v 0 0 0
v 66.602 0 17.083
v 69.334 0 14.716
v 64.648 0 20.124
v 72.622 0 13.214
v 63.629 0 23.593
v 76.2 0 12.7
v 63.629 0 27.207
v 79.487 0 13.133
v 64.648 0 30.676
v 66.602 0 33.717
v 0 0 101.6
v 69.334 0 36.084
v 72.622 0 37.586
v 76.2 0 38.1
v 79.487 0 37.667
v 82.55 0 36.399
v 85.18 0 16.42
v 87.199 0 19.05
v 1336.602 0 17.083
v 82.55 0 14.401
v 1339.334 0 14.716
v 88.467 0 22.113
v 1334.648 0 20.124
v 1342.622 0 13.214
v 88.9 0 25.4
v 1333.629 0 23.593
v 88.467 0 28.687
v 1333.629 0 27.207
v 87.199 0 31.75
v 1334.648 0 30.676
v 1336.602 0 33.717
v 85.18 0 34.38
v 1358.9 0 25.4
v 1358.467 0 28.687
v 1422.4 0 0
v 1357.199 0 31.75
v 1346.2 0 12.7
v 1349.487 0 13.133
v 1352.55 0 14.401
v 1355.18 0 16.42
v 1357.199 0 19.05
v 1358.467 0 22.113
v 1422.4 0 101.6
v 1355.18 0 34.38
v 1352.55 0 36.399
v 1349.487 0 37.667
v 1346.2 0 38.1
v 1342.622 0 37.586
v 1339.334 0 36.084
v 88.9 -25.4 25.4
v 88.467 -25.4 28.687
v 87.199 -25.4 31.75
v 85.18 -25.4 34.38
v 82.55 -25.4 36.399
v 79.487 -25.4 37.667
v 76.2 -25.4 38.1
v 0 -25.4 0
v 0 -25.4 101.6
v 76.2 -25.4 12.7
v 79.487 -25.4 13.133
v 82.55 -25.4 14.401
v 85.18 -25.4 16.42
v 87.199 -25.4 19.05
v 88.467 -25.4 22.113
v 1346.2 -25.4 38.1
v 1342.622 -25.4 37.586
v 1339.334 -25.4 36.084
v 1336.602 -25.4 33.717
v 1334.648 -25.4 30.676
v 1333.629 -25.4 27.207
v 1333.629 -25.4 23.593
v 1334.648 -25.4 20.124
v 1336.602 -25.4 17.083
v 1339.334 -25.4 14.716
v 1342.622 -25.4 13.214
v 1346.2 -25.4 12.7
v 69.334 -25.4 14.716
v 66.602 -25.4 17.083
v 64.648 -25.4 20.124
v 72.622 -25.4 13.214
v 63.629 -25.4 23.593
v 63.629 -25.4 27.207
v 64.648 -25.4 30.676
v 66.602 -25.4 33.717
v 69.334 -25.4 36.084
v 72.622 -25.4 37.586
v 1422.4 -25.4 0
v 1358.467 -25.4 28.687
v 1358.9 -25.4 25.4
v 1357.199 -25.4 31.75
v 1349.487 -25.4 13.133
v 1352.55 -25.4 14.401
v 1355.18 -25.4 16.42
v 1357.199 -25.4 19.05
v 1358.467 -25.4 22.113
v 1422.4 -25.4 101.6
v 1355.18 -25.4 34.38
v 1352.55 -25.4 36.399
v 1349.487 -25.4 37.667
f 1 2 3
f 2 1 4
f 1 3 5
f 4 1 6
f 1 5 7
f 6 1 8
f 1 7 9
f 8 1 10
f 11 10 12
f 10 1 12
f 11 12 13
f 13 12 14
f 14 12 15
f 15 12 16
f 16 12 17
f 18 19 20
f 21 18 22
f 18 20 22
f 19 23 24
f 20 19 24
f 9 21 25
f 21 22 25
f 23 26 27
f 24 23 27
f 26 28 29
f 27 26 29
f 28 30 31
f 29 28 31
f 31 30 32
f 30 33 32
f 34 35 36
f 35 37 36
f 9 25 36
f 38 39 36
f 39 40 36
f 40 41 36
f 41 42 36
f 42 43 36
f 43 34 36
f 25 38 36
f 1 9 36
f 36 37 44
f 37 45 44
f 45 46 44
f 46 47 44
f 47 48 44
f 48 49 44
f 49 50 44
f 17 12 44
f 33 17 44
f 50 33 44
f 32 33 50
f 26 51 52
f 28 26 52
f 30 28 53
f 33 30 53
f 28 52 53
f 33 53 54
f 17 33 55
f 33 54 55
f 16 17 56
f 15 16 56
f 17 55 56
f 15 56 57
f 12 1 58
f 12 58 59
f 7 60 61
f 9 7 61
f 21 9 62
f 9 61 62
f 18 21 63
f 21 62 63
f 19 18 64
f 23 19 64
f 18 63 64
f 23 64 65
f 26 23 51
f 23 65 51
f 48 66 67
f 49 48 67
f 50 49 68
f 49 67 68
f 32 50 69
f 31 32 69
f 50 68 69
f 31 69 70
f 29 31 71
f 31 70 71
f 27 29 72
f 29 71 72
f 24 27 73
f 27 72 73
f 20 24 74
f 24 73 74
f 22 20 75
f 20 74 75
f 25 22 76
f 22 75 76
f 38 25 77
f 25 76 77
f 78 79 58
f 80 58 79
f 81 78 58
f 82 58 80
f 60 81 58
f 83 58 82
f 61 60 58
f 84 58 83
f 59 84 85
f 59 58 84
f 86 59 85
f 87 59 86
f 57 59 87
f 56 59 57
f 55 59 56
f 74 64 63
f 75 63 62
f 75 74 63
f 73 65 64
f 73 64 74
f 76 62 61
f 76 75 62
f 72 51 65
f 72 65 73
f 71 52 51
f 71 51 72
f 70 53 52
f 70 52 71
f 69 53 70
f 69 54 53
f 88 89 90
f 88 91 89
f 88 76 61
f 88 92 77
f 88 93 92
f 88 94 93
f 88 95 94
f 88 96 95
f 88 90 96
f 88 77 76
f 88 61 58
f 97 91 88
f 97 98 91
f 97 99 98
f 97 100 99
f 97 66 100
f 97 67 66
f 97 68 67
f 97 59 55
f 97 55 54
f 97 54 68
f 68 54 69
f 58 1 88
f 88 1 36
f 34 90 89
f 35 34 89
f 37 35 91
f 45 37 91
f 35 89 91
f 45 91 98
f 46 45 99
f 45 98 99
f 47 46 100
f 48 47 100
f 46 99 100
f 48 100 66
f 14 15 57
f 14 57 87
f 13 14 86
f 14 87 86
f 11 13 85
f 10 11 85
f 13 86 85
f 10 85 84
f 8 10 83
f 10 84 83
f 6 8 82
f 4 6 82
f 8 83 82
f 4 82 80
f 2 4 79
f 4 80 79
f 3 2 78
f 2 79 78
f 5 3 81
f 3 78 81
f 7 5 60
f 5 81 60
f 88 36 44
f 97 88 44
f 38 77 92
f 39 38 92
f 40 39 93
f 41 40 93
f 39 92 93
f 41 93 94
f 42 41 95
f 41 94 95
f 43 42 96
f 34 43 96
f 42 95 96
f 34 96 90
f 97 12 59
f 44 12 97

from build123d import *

# Parameters (mm, degrees)
F0_W     = 1422.4
F0_H     = 101.6
F1_DEPTH = 25.4
F3_DEPTH = 25.401


with BuildPart() as f1:
    # F0 (on Front) → F1 (new body)
    with BuildSketch(Plane.XZ):
        with Locations((711.2, 50.8)):
            Rectangle(F0_W, F0_H)
    extrude(amount=F1_DEPTH)

    # F2 (on face) → F3 (cut, through all)
    with BuildSketch(Plane.XZ.offset(25.4)):
        with BuildLine():
            ThreePointArc((88.9, 25.4), (85.180256, 34.380256), (76.2, 38.1))
            Line((76.2, 38.1), (76.2, 12.7))
            ThreePointArc((76.2, 12.7), (85.180256, 16.419744), (88.9, 25.4))
        make_face()
        with BuildLine():
            Line((76.2, 12.7), (76.2, 38.1))
            ThreePointArc((76.2, 38.1), (63.5, 25.4), (76.2, 12.7))
        make_face()
        with BuildLine():
            ThreePointArc((1358.9, 25.4), (1355.180256, 34.380256), (1346.2, 38.1))
            Line((1346.2, 38.1), (1346.2, 12.7))
            ThreePointArc((1346.2, 12.7), (1355.180256, 16.419744), (1358.9, 25.4))
        make_face()
        with BuildLine():
            Line((1346.2, 12.7), (1346.2, 38.1))
            ThreePointArc((1346.2, 38.1), (1333.5, 25.4), (1346.2, 12.7))
        make_face()
    extrude(amount=-F3_DEPTH, mode=Mode.SUBTRACT)


solid = f1.part
